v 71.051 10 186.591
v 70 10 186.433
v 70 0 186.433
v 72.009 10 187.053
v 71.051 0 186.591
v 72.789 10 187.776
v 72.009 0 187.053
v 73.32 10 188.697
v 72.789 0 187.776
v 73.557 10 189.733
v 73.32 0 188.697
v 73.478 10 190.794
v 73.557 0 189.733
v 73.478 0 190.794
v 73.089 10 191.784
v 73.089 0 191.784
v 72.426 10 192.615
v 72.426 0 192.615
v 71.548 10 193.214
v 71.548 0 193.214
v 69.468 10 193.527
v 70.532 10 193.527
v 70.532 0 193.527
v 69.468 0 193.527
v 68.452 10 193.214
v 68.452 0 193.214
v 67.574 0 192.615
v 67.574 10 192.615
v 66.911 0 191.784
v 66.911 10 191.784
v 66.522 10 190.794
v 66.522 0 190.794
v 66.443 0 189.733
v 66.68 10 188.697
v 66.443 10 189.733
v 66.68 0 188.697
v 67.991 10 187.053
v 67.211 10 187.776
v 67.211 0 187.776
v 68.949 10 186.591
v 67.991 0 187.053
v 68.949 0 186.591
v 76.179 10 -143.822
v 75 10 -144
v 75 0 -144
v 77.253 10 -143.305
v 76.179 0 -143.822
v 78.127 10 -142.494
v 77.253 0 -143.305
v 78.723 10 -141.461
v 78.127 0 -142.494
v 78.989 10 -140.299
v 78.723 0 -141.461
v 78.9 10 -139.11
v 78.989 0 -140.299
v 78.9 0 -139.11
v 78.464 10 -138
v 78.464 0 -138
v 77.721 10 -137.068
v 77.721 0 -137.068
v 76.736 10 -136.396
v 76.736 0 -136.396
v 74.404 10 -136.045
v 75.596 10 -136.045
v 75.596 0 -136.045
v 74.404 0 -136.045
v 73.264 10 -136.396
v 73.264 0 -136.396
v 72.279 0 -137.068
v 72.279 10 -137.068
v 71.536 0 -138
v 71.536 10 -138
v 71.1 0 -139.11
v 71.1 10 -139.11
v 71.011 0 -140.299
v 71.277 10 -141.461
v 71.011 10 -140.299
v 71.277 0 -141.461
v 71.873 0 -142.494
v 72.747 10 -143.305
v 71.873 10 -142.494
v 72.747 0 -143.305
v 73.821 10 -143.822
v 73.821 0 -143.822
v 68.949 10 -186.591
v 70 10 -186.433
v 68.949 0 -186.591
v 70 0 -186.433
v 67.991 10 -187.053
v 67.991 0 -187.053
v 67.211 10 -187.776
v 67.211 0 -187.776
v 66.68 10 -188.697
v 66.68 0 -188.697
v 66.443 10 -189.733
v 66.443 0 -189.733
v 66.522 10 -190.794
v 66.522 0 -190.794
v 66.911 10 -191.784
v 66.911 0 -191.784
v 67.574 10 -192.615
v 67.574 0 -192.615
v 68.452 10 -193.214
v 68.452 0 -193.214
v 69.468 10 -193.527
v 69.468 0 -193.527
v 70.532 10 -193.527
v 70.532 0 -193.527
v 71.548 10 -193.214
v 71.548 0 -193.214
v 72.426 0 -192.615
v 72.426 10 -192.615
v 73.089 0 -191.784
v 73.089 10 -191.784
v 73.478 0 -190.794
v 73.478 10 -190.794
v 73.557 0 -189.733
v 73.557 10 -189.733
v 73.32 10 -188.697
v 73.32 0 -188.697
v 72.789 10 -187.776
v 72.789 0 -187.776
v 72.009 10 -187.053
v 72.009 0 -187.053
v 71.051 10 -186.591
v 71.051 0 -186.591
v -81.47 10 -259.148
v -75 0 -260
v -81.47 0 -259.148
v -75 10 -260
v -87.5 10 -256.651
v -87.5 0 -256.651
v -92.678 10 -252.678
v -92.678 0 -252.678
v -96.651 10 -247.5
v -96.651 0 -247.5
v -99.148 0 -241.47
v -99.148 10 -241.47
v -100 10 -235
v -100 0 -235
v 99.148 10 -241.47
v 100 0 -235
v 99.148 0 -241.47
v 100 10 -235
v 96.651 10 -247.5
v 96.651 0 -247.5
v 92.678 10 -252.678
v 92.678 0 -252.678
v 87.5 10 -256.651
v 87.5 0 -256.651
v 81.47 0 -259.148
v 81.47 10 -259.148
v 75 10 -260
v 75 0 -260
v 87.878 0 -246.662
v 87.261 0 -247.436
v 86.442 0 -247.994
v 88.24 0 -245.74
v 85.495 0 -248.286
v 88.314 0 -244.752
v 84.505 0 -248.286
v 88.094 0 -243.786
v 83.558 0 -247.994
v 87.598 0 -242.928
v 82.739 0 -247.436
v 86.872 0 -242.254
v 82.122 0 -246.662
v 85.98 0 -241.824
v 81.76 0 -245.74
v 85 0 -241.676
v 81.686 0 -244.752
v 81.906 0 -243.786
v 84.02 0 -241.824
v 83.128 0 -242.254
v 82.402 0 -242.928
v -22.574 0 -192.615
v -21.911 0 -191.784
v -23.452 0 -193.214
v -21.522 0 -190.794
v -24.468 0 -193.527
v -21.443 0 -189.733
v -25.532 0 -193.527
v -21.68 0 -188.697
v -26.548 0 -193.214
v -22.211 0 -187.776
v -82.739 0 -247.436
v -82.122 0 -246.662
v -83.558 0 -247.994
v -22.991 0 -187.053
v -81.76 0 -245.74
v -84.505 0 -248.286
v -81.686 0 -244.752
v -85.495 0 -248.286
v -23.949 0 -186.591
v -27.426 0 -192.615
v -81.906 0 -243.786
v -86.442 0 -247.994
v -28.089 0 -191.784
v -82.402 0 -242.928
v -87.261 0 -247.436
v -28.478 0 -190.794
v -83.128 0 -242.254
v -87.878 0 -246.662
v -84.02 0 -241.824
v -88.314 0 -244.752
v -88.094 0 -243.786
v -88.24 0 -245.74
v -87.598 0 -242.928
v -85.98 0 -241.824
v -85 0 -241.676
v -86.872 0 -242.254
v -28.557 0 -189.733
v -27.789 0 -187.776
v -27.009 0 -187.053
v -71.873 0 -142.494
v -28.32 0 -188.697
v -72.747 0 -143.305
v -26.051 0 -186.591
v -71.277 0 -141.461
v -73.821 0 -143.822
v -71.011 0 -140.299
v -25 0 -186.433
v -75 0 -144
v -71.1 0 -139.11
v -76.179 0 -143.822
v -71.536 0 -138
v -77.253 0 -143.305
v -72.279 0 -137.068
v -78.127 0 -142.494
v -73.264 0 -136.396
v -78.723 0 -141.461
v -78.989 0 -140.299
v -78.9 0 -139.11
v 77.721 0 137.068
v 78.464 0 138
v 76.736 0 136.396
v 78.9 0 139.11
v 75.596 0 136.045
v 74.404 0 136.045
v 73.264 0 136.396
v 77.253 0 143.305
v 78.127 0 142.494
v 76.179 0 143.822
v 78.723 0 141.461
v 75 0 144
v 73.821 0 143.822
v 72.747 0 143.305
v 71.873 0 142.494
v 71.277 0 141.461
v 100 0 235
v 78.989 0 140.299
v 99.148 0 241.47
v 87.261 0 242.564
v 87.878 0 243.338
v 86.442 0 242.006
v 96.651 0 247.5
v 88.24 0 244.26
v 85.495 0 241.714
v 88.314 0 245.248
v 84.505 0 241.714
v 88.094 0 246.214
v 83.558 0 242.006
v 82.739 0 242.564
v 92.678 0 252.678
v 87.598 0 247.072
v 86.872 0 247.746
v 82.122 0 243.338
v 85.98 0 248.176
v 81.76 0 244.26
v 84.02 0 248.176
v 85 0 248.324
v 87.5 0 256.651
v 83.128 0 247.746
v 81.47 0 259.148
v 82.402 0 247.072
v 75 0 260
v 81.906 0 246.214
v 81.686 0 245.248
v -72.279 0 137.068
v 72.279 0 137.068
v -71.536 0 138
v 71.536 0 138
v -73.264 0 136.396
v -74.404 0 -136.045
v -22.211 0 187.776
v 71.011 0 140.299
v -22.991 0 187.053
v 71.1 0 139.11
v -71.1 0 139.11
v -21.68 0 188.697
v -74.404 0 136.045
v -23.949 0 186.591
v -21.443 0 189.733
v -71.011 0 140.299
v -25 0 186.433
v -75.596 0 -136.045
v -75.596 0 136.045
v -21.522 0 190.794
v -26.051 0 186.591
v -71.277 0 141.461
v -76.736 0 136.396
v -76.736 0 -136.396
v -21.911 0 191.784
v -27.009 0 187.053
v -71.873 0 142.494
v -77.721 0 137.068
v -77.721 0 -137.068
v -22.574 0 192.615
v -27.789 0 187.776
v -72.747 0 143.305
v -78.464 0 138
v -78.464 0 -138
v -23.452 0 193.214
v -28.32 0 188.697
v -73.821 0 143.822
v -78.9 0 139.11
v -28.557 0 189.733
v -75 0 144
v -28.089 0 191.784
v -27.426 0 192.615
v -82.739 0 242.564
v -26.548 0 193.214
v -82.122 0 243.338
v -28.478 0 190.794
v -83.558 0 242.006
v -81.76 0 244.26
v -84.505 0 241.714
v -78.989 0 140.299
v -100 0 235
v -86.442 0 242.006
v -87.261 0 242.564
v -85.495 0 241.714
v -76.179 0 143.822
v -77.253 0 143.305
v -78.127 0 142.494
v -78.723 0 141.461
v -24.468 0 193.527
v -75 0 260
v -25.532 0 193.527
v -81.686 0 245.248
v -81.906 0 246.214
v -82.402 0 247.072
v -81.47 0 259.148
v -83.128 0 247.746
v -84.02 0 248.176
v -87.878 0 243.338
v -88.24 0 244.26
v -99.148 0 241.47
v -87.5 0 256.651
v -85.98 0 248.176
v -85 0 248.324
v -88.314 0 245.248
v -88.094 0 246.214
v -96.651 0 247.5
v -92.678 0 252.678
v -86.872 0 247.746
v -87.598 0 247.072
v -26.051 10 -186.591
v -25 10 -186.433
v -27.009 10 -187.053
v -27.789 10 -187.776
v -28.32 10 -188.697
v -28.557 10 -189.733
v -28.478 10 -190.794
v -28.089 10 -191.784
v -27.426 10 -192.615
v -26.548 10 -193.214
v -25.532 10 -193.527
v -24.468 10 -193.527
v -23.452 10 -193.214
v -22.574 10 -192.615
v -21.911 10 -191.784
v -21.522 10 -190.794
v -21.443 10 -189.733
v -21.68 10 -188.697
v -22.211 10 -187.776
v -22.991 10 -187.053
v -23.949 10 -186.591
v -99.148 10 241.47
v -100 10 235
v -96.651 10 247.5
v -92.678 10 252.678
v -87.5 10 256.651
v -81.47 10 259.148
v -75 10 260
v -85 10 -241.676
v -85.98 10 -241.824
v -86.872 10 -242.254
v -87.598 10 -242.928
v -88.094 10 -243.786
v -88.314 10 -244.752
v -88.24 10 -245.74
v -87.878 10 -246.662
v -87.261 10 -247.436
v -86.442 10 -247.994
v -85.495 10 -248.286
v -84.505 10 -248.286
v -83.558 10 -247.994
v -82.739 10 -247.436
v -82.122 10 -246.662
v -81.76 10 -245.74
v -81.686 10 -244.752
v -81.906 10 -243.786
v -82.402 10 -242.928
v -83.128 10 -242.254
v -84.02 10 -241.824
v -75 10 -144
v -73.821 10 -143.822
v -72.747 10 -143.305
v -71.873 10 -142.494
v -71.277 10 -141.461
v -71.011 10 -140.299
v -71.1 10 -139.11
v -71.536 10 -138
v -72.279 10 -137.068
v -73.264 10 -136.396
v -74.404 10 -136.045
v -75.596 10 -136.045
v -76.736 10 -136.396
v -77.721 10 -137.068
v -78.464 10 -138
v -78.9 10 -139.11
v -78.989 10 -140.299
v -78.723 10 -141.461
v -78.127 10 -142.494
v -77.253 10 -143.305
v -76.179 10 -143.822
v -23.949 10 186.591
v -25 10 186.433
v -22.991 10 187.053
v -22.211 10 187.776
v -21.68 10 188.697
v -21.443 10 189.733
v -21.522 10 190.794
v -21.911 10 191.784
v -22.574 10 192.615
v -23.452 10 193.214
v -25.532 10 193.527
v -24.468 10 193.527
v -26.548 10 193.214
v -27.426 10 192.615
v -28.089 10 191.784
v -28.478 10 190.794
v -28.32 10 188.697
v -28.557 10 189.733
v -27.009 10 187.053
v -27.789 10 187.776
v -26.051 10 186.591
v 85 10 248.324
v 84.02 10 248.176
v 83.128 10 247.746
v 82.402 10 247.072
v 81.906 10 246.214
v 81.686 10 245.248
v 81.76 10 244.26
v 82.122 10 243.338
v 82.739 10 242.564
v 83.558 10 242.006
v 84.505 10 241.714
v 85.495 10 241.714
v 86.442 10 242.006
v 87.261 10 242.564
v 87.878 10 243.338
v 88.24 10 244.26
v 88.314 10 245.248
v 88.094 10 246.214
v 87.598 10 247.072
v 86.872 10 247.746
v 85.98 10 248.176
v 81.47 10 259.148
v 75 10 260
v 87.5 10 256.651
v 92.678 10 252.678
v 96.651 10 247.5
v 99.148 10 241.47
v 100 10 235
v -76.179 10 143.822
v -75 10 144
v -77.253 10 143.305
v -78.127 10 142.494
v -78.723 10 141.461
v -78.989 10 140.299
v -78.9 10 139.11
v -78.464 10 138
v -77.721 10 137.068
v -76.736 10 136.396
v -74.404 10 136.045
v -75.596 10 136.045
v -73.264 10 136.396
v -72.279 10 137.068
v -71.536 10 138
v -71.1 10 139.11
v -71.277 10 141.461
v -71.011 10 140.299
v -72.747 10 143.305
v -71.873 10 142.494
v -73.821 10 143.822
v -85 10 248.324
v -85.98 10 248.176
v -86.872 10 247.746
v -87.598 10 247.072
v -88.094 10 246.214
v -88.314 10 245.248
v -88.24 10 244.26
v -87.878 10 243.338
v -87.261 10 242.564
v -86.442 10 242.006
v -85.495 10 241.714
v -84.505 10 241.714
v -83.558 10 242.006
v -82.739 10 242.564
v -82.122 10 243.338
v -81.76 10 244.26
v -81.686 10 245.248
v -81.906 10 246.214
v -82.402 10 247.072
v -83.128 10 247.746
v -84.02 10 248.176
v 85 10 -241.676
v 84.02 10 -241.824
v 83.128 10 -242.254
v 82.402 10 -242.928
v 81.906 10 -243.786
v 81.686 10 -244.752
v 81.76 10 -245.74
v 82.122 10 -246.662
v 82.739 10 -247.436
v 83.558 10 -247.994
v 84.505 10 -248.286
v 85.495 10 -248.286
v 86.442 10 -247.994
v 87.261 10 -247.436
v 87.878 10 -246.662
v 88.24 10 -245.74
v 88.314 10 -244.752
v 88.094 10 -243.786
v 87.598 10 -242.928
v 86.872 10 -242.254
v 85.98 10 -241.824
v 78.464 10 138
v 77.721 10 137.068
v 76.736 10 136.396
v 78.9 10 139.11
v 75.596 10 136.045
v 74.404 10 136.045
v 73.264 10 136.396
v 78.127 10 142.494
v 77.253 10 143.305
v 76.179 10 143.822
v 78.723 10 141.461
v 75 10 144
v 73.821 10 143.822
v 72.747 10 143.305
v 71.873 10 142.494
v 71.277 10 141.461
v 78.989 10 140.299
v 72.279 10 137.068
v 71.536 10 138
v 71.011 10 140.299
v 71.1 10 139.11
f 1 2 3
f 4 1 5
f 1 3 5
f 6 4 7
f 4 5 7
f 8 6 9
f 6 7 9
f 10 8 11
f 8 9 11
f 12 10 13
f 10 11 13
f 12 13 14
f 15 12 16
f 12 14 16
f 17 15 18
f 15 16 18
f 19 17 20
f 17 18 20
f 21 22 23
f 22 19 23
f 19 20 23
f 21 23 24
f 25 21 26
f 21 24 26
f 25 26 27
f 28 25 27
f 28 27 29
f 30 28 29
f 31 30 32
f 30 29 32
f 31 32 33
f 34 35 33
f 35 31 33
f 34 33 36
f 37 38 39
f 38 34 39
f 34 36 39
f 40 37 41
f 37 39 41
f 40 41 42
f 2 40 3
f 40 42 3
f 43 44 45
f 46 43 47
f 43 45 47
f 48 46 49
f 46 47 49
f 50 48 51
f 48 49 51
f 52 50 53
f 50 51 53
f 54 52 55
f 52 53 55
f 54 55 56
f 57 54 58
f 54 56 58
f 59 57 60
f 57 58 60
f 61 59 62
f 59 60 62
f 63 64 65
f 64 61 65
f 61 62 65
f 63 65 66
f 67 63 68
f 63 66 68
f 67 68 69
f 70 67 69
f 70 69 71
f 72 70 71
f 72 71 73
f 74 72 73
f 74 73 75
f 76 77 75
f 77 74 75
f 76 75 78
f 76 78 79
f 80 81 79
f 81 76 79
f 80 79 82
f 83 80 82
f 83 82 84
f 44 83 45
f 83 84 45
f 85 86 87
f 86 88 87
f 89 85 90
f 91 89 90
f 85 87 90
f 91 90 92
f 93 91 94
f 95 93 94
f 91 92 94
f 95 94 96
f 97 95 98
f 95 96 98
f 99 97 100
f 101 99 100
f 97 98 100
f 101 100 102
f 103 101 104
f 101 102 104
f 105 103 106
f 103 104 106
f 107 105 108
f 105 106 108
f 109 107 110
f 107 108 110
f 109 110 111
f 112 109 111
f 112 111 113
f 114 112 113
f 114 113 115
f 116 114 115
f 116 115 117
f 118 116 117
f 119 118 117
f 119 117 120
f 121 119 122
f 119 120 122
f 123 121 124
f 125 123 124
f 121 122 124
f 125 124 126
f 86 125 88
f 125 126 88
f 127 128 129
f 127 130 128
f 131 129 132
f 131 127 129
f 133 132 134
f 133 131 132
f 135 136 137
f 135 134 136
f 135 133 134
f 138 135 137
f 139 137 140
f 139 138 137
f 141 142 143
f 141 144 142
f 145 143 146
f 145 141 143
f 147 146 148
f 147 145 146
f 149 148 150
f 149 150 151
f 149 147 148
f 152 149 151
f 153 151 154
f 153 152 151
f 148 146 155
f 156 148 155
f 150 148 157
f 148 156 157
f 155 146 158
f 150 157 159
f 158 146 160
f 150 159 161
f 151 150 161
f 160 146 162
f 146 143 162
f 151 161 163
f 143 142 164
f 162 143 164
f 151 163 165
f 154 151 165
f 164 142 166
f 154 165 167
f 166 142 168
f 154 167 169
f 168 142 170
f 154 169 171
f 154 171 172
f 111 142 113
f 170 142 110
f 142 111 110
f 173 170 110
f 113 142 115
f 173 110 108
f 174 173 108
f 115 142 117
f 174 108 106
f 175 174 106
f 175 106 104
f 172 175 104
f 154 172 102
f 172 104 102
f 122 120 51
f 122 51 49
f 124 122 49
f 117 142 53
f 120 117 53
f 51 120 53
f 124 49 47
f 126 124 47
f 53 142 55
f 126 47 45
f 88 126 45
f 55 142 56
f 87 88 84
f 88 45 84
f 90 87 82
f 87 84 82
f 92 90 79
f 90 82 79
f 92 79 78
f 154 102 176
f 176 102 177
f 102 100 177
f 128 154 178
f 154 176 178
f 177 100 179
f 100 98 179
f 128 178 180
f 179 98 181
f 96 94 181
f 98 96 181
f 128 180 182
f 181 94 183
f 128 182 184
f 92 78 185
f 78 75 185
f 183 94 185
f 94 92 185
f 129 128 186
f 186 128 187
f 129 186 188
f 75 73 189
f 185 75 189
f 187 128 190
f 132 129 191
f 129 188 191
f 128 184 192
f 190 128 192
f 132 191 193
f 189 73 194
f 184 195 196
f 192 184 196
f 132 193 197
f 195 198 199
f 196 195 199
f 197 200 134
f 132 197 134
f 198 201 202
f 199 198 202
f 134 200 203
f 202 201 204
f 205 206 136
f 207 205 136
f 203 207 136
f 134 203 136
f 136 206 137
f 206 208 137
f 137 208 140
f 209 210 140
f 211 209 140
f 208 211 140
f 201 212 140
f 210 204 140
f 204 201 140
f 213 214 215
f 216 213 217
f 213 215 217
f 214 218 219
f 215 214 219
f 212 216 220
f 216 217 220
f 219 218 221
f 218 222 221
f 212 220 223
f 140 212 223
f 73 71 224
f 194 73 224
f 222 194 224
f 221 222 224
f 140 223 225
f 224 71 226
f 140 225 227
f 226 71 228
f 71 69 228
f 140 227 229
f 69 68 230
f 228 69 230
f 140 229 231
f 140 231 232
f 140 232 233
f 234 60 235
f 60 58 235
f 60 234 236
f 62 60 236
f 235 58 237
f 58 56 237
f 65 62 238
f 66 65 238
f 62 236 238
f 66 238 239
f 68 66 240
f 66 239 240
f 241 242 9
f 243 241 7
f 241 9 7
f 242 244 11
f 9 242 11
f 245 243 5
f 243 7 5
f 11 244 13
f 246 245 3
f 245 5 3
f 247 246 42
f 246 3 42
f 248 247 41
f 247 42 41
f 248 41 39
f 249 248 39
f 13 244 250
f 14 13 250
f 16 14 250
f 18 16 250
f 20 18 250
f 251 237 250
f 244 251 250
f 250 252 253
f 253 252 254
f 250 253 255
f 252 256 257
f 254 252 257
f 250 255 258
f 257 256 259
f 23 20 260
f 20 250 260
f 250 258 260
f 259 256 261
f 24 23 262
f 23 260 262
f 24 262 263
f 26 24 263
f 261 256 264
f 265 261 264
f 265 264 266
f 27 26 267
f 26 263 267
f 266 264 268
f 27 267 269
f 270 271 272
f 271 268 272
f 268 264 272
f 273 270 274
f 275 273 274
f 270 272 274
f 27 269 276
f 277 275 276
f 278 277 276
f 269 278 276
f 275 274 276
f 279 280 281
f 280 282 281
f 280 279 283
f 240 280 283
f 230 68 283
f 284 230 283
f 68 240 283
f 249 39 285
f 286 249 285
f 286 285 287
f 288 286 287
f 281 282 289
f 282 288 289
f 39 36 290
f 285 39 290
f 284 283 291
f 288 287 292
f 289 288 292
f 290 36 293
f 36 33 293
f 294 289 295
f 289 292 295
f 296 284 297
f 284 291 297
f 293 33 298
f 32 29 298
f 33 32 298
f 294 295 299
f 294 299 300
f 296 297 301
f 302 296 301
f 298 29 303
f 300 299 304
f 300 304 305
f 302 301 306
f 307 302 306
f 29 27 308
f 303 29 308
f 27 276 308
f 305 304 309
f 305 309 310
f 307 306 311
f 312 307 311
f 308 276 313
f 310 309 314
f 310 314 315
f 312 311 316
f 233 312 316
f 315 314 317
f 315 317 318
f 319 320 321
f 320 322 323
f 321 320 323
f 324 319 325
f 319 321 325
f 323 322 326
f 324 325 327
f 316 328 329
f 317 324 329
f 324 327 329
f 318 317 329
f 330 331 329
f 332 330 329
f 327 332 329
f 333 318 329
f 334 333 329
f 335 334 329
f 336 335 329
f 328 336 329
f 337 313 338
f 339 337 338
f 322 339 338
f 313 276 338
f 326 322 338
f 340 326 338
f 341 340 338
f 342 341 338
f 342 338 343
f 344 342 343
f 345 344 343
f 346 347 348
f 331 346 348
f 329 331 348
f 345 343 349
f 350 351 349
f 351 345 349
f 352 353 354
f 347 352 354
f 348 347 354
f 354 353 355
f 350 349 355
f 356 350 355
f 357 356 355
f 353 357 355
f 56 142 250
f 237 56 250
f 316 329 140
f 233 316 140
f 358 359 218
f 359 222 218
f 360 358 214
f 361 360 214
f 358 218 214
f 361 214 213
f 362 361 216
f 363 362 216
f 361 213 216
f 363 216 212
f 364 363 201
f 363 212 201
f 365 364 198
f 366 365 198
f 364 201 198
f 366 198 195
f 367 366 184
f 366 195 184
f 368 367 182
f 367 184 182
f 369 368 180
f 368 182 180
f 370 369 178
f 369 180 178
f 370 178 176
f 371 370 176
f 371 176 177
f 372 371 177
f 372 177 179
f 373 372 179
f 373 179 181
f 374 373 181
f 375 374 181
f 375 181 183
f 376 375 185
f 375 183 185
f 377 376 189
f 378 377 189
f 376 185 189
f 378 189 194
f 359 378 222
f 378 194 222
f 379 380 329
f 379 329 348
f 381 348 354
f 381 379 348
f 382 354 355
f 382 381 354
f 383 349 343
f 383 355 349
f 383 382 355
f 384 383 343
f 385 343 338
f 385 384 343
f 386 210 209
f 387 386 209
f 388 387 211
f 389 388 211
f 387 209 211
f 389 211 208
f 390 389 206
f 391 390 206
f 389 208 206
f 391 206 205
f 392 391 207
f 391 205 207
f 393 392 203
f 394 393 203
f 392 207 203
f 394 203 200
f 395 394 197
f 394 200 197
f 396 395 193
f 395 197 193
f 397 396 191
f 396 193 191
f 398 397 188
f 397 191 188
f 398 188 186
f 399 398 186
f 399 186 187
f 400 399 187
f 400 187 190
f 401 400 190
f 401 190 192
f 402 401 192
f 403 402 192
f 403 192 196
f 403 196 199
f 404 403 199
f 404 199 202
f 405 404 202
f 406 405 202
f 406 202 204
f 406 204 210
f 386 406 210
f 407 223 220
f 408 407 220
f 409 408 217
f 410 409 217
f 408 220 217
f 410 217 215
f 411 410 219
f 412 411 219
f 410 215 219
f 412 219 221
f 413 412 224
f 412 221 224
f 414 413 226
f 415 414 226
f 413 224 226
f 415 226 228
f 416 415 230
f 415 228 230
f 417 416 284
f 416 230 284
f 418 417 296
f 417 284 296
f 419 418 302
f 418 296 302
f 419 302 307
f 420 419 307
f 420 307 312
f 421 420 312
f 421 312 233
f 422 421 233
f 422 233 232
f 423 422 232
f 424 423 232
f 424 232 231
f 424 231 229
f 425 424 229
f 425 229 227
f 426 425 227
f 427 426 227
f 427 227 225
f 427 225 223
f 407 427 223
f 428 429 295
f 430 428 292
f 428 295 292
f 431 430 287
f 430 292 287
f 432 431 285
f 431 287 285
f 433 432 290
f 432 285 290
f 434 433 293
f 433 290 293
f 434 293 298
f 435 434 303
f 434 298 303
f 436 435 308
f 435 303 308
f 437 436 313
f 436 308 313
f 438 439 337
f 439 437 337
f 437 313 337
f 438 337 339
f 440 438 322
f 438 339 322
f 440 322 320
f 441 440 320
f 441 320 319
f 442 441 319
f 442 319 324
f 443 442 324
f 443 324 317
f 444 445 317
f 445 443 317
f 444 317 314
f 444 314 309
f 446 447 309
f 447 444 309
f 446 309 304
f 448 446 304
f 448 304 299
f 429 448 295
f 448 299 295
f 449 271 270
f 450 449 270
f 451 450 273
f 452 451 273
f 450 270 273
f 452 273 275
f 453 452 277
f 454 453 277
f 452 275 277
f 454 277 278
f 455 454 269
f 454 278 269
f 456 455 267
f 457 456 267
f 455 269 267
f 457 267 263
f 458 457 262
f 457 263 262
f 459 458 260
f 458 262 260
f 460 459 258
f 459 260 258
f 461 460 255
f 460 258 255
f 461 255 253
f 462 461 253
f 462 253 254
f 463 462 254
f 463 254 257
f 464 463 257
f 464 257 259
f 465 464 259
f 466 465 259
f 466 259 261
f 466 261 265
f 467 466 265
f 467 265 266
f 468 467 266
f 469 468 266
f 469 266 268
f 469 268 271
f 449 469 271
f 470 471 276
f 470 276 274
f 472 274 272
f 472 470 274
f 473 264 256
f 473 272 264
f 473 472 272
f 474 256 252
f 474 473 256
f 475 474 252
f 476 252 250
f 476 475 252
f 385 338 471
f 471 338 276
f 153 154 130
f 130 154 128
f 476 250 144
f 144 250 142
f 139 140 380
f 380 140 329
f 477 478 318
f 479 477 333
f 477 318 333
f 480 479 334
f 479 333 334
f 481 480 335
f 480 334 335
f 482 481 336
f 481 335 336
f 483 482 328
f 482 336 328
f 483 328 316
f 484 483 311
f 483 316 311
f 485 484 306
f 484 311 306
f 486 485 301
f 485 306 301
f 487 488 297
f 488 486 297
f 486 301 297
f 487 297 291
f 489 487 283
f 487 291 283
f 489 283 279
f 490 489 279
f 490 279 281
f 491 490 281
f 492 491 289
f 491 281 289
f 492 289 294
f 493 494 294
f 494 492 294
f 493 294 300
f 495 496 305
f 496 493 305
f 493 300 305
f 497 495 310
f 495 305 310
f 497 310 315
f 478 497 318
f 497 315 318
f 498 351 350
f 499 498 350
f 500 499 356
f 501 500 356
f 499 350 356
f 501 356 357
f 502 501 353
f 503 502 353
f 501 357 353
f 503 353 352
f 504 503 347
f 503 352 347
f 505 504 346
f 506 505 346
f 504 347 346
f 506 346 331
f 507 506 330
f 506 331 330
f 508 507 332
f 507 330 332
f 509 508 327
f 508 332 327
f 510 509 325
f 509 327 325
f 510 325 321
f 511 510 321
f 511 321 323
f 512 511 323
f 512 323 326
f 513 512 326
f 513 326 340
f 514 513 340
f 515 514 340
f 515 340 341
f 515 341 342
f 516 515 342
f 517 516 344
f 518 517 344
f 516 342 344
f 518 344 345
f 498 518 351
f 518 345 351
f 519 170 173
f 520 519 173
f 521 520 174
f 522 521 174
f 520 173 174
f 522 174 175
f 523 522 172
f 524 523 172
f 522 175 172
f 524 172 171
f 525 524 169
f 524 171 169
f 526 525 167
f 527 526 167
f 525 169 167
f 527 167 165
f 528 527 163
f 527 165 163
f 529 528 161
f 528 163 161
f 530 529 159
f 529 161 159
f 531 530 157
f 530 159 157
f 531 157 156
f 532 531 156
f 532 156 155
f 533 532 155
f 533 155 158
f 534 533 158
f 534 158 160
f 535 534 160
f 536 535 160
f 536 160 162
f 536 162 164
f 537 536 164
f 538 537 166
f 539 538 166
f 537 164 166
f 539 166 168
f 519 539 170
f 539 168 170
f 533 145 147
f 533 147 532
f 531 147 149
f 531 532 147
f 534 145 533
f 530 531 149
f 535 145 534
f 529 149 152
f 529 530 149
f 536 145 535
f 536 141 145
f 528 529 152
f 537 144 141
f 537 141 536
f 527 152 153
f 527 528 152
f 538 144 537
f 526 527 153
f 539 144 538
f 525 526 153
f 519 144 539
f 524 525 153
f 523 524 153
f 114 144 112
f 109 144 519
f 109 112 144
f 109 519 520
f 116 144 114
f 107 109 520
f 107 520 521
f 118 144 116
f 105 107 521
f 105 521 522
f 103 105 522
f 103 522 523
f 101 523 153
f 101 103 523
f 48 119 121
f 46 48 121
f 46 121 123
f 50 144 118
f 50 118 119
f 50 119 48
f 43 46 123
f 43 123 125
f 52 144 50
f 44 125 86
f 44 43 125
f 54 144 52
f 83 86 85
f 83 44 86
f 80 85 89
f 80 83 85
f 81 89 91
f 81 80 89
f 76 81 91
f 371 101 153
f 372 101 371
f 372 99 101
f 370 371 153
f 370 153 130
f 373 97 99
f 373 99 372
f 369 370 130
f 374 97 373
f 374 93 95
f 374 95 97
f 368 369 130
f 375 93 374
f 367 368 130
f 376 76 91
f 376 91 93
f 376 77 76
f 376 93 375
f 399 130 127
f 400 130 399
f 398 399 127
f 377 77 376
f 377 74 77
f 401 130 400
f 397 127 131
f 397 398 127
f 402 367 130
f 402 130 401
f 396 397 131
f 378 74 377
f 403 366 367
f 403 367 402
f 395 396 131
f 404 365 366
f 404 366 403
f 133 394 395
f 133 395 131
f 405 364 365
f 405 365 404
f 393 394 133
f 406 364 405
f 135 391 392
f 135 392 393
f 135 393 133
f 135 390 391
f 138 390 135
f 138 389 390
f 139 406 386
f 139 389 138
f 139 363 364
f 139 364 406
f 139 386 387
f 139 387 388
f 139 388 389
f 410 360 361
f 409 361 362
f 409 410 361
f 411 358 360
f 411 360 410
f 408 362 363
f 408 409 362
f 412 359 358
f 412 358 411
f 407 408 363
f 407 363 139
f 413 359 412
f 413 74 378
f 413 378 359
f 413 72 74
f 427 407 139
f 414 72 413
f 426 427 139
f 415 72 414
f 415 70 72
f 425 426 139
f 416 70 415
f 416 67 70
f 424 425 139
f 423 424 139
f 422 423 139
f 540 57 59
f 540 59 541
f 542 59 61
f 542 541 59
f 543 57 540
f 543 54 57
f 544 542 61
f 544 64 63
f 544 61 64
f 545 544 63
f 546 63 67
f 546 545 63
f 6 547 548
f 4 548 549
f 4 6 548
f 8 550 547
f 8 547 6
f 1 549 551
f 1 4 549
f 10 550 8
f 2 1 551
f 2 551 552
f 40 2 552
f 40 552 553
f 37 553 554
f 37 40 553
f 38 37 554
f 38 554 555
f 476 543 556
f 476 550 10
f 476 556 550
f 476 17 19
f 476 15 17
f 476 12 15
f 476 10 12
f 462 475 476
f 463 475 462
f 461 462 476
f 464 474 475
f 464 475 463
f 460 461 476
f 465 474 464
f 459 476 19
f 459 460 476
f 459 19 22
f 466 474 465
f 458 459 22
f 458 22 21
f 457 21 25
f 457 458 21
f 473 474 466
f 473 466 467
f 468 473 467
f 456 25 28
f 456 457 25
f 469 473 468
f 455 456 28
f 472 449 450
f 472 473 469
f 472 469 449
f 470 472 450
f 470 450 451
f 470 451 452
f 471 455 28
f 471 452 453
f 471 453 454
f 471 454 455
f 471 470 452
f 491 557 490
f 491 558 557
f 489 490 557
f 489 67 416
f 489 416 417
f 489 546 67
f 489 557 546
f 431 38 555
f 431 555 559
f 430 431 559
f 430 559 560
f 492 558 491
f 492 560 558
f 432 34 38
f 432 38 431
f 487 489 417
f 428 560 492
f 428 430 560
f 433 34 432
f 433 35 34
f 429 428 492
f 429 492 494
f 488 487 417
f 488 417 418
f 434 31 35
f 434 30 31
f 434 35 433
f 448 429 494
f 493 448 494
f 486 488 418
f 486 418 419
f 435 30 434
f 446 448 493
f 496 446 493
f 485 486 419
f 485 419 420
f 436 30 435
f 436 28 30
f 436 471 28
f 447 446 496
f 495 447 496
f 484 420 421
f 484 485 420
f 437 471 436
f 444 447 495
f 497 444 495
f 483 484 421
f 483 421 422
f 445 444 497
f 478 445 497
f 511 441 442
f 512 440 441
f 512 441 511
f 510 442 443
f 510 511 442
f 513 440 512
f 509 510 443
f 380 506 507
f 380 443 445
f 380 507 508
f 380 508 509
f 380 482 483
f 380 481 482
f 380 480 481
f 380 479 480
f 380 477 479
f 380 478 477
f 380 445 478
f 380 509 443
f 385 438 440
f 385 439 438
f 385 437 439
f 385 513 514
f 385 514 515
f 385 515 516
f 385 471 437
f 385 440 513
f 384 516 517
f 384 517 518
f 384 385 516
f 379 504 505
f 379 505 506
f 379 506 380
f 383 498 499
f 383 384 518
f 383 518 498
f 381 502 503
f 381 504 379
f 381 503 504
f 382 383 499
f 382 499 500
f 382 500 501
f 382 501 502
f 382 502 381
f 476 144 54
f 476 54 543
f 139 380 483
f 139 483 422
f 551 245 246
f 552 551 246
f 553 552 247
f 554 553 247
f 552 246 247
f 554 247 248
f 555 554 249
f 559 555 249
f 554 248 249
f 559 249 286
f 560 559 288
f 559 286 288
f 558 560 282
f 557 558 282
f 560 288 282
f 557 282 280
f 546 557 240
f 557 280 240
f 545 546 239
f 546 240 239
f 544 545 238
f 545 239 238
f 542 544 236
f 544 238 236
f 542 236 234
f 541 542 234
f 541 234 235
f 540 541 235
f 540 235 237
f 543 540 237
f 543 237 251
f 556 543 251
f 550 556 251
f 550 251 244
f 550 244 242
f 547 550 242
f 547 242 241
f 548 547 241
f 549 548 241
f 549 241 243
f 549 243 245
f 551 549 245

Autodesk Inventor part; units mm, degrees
ref_plane "YZ Plane" through (0, 0, 0) normal (1, 0, 0) x (0, 1, 0)
ref_plane "XZ Plane" through (0, 0, 0) normal (0, 1, 0) x (-1, 0, 0)
ref_plane "XY Plane" through (0, 0, 0) normal (0, 0, 1) x (1, 0, 0)
sketch "Sketch1" plane through (0, 0, 0) normal (0, 1, 0) x (-1, 0, 0)
  line L0 (-100, -260) -> (100, -260)
  line L1 (100, -260) -> (100, 260)
  line L2 (100, 260) -> (-100, 260)
  line L3 (-100, 260) -> (-100, -260)
  line L4 (-100, -260) -> (100, 260) construction
  line L5 (100, -260) -> (-100, 260) construction
  point P0 (0, 0)
  dimension "d0" = 200
  dimension "d1" = 520
extrude "Extrusion1" add sketch "Sketch1" along normal blind 10
fillet "Fillet1" radius 25 4 edges at (-100, 5, -260) (-100, 5, 260) (100, 5, 260) (100, 5, -260)
sketch "Sketch2" plane through (0, 10, 0) normal (0, 1, 0) x (1, 0, 0)
  line L0 (100, -235) -> (100, 235) projected
  line L1 (-75, -260) -> (75, -260) projected
  point P0 (0, 0)
  point P1 (85, -245)
  dimension "d5" = 15
  dimension "d6" = 15
hole "Hole1" at (85, 10, 245) direction (0, -1, 0) diameter 6.647 end through all thread size "M8x1.25" class "6H" standard "ISO Metric profile"
pattern_linear "Rectangular Pattern1" count 2 spacing 170 along (-1, 0, 0) count 2 spacing 490 along (0, 0, -1) of "Hole1"
sketch "Sketch3" plane through (0, 10, 0) normal (0, 1, 0) x (1, 0, 0)
  line L0 (100, -235) -> (100, 235) projected
  line L1 (75, 260) -> (-75, 260) projected
  point P0 (0, 0)
  point P1 (70, 190)
  point P2 (-25, 190)
  dimension "d20" = 30
  dimension "d21" = 70
  dimension "d22" = 95
  dimension "d23" = 70
hole "Hole2" at (70, 10, -190) at (-25, 10, -190) direction (0, -1, 0) diameter 7.134 depth 20.2 tip angle 118 thread size "M8x0.8" class "6H" standard "ISO Metric profile"
mirror "Mirror1" about plane through (0, 0, 0) normal (0, 0, 1) of "Hole2"
sketch "Sketch4" plane through (0, 10, 0) normal (0, 1, 0) x (1, 0, 0)
  line L0 (100, -235) -> (100, 235) projected
  line L1 (-75, -260) -> (75, -260) projected
  point P0 (0, 0)
  point P1 (75, -140)
  dimension "d31" = 25
  dimension "d32" = 120
hole "Hole3" at (75, 10, 140) direction (0, -1, 0) diameter 8 end through all
mirror "Mirror2" about plane through (0, 0, 0) normal (0, 0, 1) of "Hole3"
mirror "Mirror3" about plane through (0, 0, 0) normal (1, 0, 0) of "Hole3", "Mirror2"
properties part number "Body_plate"
